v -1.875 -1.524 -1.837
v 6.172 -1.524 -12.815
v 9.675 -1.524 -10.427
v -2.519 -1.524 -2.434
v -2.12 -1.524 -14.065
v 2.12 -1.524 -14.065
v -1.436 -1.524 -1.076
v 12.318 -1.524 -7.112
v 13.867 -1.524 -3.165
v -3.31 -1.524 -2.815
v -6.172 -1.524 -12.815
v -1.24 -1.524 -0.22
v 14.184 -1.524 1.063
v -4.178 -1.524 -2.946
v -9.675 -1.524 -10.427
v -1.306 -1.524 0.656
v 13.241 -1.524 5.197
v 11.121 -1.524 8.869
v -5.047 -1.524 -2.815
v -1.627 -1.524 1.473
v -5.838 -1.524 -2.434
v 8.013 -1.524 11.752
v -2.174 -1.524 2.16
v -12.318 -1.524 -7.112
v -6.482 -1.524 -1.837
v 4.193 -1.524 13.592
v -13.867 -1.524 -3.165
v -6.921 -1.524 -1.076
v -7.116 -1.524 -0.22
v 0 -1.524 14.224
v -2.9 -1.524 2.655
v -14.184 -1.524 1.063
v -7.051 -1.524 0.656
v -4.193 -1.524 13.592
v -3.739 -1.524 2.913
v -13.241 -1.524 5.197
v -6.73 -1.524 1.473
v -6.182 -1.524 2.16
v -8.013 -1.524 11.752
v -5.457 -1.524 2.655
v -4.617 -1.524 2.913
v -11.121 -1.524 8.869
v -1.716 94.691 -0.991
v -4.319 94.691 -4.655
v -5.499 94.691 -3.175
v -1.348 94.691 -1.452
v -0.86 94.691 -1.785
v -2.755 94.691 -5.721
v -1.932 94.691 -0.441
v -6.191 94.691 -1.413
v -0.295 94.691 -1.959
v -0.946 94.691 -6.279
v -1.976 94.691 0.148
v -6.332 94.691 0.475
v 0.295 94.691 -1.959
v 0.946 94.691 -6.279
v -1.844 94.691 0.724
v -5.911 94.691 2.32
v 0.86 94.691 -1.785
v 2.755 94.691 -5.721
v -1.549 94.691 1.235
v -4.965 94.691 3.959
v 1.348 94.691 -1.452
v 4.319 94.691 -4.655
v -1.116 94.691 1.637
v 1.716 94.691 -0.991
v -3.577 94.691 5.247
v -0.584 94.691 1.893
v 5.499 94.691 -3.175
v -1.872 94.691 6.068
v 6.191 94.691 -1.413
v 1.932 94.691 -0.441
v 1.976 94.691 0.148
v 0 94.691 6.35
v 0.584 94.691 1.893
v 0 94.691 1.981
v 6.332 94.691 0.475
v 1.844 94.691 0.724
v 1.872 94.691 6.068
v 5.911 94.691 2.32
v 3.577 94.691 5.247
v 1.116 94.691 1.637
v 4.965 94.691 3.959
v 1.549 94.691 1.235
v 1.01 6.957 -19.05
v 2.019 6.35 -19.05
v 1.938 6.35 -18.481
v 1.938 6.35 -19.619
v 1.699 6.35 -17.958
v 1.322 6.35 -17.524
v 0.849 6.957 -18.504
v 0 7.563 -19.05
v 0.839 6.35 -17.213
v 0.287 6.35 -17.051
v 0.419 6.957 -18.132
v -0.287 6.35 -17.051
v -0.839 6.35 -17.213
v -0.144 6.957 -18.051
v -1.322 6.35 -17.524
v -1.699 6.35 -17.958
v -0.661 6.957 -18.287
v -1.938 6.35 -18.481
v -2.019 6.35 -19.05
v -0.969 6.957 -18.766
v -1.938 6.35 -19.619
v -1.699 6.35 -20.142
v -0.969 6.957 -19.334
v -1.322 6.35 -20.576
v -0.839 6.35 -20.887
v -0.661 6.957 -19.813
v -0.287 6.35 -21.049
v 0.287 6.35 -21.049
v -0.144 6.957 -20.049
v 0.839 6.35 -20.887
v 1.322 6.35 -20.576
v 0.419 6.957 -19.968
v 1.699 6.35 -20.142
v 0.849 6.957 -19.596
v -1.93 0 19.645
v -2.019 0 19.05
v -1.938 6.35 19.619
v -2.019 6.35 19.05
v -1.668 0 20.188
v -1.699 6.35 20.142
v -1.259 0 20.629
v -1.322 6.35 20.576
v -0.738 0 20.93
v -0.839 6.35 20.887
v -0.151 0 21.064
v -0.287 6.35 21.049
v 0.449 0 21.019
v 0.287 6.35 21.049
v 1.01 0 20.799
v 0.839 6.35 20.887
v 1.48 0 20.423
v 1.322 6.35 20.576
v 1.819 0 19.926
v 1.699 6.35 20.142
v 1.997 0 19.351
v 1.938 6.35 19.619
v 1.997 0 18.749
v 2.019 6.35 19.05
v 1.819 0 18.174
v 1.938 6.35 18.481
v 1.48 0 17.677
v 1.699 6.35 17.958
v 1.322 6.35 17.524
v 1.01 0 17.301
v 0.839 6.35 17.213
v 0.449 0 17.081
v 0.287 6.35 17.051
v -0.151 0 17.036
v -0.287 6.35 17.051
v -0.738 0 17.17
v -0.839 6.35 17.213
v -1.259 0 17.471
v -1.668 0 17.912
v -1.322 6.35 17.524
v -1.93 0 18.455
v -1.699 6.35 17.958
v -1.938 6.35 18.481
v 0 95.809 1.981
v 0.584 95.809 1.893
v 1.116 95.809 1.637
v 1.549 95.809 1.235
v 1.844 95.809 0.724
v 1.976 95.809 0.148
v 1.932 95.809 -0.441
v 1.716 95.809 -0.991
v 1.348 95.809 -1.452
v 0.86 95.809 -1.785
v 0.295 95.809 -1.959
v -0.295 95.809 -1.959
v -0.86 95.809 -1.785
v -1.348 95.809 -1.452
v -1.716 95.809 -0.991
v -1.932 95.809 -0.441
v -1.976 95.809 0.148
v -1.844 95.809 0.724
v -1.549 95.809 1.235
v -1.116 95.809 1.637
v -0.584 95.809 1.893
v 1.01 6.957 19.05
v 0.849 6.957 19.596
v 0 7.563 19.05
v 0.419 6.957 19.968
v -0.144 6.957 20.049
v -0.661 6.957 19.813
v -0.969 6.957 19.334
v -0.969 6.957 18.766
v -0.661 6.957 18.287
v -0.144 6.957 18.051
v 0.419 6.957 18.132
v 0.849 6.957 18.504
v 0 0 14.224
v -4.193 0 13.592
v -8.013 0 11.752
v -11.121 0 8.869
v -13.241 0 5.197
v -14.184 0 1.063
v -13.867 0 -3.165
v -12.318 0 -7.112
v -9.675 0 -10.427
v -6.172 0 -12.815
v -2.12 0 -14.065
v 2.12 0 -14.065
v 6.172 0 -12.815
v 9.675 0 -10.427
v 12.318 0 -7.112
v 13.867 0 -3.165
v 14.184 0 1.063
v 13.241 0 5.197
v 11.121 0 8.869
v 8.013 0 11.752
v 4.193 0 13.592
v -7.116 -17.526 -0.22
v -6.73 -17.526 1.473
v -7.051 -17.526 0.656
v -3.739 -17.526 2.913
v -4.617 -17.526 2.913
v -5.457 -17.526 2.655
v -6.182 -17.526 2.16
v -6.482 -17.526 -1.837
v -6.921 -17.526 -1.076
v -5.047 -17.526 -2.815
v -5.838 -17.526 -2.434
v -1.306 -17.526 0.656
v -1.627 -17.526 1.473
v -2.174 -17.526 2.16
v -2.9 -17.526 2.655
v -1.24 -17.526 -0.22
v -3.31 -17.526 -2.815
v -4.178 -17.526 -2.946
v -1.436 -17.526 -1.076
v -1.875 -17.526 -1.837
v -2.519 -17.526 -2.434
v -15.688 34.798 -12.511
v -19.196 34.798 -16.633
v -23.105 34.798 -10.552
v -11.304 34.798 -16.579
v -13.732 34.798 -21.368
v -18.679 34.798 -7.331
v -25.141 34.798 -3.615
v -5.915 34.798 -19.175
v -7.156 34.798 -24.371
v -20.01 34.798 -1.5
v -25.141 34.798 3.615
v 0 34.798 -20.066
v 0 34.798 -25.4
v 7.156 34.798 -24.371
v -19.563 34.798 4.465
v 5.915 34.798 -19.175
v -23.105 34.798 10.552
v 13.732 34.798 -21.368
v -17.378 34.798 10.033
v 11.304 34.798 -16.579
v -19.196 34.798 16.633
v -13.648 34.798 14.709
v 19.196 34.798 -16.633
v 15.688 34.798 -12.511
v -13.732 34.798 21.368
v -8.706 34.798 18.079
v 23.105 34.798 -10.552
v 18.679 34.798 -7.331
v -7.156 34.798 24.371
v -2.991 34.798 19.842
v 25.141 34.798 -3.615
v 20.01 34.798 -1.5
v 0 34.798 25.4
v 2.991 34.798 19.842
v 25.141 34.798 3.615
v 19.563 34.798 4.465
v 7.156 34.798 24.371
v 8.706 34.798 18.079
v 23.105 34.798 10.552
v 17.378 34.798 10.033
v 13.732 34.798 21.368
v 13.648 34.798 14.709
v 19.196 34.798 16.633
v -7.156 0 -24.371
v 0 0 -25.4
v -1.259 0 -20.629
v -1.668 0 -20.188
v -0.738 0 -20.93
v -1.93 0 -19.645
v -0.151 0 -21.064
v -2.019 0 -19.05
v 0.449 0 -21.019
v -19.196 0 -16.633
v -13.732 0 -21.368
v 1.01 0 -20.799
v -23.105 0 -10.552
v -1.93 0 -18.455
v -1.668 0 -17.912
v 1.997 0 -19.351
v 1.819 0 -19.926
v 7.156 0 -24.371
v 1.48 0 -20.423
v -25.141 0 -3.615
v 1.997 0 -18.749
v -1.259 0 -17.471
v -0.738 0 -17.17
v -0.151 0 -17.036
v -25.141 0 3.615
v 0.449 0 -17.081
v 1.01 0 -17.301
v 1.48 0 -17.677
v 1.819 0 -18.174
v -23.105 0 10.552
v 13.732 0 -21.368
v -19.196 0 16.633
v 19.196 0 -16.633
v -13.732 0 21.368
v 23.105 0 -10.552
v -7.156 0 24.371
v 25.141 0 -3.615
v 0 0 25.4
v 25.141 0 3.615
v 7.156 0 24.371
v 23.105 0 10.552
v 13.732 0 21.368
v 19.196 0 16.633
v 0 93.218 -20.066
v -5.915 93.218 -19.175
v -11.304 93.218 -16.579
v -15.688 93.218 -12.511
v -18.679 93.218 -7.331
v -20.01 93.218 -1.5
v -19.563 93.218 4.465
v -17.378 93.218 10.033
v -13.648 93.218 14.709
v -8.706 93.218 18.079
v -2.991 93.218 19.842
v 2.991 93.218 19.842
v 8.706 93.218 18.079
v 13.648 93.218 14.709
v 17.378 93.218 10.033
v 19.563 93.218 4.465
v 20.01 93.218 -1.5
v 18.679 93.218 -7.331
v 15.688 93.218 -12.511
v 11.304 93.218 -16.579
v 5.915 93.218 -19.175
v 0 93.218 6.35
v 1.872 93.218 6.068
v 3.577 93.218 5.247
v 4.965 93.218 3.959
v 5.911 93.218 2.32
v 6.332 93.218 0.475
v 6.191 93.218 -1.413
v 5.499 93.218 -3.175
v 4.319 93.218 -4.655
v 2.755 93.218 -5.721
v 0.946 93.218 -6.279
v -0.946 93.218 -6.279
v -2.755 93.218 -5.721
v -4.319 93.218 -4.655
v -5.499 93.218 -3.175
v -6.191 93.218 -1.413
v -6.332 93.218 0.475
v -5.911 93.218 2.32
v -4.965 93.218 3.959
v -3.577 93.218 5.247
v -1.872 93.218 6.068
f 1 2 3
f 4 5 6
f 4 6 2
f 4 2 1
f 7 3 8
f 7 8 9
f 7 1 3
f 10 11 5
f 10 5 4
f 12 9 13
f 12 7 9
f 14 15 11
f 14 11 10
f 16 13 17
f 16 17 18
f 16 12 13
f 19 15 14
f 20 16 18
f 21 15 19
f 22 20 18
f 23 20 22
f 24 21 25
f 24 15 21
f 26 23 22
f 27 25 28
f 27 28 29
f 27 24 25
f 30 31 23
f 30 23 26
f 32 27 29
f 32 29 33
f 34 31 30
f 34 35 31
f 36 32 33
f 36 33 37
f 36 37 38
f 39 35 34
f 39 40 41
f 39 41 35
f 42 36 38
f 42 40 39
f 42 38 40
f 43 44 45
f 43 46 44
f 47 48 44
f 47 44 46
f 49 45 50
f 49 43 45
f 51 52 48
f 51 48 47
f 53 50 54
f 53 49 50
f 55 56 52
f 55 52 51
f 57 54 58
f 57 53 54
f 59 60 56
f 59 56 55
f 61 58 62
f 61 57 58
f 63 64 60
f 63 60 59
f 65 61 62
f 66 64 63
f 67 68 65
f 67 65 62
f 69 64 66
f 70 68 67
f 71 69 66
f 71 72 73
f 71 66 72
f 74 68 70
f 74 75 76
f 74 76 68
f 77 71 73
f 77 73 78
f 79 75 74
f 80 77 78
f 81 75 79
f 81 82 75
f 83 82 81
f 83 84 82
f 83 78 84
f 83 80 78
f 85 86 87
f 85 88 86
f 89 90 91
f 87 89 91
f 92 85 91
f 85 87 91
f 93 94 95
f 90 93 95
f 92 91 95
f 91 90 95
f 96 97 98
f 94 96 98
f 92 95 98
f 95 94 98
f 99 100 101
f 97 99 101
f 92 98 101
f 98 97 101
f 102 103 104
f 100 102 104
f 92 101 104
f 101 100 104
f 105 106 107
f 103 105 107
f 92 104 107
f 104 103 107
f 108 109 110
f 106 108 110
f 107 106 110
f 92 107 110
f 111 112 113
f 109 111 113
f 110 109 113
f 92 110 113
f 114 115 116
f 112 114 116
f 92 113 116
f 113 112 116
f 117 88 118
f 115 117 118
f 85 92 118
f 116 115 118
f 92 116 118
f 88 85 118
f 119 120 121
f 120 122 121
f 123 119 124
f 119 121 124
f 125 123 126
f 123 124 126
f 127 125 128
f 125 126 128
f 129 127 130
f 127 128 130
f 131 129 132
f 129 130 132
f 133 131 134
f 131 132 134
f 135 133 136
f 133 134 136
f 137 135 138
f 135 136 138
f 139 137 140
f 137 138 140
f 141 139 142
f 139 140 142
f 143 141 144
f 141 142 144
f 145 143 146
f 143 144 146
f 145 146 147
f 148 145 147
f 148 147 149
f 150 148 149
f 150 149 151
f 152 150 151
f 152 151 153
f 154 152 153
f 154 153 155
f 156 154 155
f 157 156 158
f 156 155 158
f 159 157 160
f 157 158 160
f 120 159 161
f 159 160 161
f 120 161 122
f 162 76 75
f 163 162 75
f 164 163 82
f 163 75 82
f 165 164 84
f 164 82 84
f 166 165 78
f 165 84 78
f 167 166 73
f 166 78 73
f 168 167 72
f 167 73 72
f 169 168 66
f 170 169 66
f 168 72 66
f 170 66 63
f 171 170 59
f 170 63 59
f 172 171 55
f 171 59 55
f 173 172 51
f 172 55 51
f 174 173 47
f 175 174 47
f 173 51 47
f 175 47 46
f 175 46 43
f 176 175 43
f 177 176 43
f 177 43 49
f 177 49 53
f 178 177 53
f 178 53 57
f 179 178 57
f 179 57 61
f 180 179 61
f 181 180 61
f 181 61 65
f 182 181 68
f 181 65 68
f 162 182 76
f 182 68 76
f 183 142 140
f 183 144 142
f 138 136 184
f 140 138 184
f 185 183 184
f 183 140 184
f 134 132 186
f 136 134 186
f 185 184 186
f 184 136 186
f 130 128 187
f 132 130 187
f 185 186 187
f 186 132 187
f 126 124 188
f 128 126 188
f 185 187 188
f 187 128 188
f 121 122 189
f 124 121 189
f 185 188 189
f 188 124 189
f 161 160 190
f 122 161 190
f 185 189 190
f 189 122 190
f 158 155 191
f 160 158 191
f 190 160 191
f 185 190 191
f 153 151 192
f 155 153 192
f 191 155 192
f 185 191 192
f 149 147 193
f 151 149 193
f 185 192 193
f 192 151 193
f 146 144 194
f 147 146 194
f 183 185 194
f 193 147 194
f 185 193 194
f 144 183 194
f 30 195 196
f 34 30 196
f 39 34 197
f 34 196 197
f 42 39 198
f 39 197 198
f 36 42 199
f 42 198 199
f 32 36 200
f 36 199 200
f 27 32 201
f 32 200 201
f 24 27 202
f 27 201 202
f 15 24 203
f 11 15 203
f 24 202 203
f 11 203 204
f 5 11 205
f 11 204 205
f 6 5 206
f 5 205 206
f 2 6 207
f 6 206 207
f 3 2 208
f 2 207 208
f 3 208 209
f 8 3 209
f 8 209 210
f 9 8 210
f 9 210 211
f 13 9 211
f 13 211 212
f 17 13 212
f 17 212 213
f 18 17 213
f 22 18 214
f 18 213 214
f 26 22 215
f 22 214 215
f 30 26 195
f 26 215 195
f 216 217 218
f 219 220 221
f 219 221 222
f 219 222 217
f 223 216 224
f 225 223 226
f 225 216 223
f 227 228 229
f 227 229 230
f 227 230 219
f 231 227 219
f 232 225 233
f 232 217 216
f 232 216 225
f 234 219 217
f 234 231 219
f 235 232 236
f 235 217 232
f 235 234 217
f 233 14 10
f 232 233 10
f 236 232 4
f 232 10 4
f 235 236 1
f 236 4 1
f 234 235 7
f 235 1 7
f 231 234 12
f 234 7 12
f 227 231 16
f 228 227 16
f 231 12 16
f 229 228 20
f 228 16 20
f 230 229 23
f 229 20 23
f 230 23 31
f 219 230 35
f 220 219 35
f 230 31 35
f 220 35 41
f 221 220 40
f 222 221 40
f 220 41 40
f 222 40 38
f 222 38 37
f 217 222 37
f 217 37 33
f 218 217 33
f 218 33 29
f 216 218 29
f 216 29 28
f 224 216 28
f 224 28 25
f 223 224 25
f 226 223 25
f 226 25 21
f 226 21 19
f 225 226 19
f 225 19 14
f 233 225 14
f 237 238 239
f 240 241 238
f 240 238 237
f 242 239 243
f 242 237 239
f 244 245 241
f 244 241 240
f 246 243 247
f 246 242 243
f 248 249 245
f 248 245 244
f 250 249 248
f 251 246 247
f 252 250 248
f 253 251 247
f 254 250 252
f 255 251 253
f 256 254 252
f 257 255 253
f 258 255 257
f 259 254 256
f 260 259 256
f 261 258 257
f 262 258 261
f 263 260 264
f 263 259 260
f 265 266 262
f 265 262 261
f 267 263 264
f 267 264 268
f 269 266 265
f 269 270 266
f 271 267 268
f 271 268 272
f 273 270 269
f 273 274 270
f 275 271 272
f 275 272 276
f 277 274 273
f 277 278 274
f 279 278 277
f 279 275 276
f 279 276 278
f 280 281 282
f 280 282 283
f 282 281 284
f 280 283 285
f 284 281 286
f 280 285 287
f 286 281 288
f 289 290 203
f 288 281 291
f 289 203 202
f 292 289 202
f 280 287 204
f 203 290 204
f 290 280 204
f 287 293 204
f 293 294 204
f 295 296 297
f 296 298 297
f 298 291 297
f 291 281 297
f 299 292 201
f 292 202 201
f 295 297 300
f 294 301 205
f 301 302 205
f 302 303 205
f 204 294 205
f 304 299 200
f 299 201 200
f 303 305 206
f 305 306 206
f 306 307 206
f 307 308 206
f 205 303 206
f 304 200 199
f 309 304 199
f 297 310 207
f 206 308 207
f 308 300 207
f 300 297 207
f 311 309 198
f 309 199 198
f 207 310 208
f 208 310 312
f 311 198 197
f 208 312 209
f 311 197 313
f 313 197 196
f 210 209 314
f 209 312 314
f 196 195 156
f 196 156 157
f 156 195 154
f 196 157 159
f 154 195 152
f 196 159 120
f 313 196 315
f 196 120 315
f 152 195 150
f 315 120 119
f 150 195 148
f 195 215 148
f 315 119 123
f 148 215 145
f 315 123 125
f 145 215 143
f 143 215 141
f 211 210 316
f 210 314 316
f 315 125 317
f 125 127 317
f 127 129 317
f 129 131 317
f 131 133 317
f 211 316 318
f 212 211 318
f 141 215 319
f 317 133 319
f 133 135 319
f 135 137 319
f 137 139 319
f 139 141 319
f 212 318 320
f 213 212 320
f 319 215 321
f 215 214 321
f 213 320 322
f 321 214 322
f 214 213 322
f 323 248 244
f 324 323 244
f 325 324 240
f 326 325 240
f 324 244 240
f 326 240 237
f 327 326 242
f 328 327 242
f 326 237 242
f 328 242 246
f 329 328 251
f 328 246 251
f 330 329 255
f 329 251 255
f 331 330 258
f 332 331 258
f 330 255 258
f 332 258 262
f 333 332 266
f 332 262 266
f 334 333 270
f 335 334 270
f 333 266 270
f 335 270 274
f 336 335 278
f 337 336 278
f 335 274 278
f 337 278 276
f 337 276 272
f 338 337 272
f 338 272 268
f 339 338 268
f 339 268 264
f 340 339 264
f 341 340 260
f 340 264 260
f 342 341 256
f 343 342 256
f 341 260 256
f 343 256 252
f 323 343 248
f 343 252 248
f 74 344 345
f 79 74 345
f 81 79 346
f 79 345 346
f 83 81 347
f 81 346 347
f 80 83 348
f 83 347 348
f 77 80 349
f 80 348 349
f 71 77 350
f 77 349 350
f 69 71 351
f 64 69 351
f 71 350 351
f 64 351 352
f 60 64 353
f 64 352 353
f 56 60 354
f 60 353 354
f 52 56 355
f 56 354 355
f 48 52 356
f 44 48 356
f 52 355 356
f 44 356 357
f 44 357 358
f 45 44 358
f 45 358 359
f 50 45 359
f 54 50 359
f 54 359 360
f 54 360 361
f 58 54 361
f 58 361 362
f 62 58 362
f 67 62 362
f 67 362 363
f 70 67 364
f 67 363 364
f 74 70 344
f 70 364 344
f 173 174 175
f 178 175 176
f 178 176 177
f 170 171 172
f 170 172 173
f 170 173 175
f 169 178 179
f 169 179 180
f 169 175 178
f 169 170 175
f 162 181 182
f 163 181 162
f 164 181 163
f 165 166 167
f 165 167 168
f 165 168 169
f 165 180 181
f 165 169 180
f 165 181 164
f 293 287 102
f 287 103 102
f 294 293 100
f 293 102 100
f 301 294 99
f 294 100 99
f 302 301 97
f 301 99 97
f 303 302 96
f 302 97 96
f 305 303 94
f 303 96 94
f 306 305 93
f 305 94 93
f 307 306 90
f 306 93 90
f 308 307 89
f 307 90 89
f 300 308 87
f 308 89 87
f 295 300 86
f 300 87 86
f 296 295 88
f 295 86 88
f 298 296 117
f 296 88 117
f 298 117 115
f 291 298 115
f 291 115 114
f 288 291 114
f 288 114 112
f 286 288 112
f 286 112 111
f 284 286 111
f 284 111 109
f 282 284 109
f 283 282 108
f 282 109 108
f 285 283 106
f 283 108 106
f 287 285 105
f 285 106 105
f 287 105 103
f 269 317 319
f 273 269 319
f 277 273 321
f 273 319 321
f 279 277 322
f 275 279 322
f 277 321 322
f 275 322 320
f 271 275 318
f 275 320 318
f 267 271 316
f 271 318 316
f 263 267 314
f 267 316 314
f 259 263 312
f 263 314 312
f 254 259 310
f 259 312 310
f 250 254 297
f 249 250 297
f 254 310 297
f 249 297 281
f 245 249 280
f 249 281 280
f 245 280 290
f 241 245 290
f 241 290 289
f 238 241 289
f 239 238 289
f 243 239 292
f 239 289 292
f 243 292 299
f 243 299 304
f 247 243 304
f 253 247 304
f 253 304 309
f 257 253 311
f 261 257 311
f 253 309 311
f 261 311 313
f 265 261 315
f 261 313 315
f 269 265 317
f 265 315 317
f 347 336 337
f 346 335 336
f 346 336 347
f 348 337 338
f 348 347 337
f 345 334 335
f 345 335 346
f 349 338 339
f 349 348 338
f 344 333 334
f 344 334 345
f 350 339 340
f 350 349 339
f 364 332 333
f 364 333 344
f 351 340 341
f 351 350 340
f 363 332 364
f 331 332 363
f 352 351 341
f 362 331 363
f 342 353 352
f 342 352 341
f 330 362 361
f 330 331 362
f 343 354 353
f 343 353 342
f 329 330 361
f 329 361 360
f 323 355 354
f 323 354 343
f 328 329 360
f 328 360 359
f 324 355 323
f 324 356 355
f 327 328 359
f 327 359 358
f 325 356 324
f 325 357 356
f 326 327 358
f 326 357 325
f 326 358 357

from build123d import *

# Parameters (mm, degrees)
SKETCH1_R                  = 25.4
BOSS_EXTRUDE1_DEPTH        = 34.798
SKETCH2_R                  = 20.066
BOSS_EXTRUDE2_DEPTH        = 58.42
SKETCH3_R                  = 14.224
BOSS_EXTRUDE3_DEPTH        = 1.524
SKETCH4_R                  = 6.35
BOSS_EXTRUDE4_DEPTH        = 1.4732
SKETCH5_R                  = 1.9812
BOSS_EXTRUDE5_DEPTH        = 1.1176
SKETCH6_R                  = 2.9464
BOSS_EXTRUDE6_DEPTH        = 17.526
F_10_32_TAPPED_HOLE1_D     = 4.0386
F_10_32_TAPPED_HOLE1_DEPTH = 6.35
F_10_32_TAPPED_HOLE1_TIP   = 1.213317848


with BuildPart() as part:
    # Sketch1 → Boss-Extrude1 (new body)
    with BuildSketch(Plane(origin=(0, 0, 0), x_dir=(1, 0, 0), z_dir=(0, 1, 0))):
        with Locations(Location((0, 0, 0), (0, 0, 270))):
            Circle(SKETCH1_R)
    extrude(amount=BOSS_EXTRUDE1_DEPTH)

    # Sketch2 → Boss-Extrude2 (add)
    with BuildSketch(Plane(origin=(0, 34.798, 0), x_dir=(-1, 0, 0), z_dir=(0, 1, 0))):
        with Locations(Location((0, 0, 0), (0, 0, 270))):
            Circle(SKETCH2_R)
    extrude(amount=BOSS_EXTRUDE2_DEPTH)

    # Sketch3 → Boss-Extrude3 (add)
    with BuildSketch(Plane.XZ):
        with Locations(Location((0, 0, 0), (0, 0, 90))):
            Circle(SKETCH3_R)
    extrude(amount=BOSS_EXTRUDE3_DEPTH)

    # Sketch4 → Boss-Extrude4 (add)
    with BuildSketch(Plane(origin=(0, 93.218, 0), x_dir=(-1, 0, 0), z_dir=(0, 1, 0))):
        with Locations(Location((0, 0, 0), (0, 0, 90))):
            Circle(SKETCH4_R)
    extrude(amount=BOSS_EXTRUDE4_DEPTH)

    # Sketch5 → Boss-Extrude5 (add)
    with BuildSketch(Plane(origin=(0, 94.6912, 0), x_dir=(1, 0, 0), z_dir=(0, 1, 0))):
        with Locations(Location((0, 0, 0), (0, 0, 270))):
            Circle(SKETCH5_R)
    extrude(amount=BOSS_EXTRUDE5_DEPTH)

    # Sketch6 → Boss-Extrude6 (add)
    with BuildSketch(Plane.XZ):
        with Locations(Location((-4.1783, 0, 0), (0, 0, 270))):
            Circle(SKETCH6_R)
    extrude(amount=BOSS_EXTRUDE6_DEPTH)

    # #10-32 Tapped Hole1
    with Locations(Plane.XZ):
        with Locations((0, 19.05), (0, -19.05)):
            Hole(F_10_32_TAPPED_HOLE1_D / 2, depth=F_10_32_TAPPED_HOLE1_DEPTH)
            with Locations((0, 0, -(F_10_32_TAPPED_HOLE1_DEPTH + F_10_32_TAPPED_HOLE1_TIP / 2))):  # 118° drill point
                Cone(0, F_10_32_TAPPED_HOLE1_D / 2, F_10_32_TAPPED_HOLE1_TIP, mode=Mode.SUBTRACT)


solid = part.part
